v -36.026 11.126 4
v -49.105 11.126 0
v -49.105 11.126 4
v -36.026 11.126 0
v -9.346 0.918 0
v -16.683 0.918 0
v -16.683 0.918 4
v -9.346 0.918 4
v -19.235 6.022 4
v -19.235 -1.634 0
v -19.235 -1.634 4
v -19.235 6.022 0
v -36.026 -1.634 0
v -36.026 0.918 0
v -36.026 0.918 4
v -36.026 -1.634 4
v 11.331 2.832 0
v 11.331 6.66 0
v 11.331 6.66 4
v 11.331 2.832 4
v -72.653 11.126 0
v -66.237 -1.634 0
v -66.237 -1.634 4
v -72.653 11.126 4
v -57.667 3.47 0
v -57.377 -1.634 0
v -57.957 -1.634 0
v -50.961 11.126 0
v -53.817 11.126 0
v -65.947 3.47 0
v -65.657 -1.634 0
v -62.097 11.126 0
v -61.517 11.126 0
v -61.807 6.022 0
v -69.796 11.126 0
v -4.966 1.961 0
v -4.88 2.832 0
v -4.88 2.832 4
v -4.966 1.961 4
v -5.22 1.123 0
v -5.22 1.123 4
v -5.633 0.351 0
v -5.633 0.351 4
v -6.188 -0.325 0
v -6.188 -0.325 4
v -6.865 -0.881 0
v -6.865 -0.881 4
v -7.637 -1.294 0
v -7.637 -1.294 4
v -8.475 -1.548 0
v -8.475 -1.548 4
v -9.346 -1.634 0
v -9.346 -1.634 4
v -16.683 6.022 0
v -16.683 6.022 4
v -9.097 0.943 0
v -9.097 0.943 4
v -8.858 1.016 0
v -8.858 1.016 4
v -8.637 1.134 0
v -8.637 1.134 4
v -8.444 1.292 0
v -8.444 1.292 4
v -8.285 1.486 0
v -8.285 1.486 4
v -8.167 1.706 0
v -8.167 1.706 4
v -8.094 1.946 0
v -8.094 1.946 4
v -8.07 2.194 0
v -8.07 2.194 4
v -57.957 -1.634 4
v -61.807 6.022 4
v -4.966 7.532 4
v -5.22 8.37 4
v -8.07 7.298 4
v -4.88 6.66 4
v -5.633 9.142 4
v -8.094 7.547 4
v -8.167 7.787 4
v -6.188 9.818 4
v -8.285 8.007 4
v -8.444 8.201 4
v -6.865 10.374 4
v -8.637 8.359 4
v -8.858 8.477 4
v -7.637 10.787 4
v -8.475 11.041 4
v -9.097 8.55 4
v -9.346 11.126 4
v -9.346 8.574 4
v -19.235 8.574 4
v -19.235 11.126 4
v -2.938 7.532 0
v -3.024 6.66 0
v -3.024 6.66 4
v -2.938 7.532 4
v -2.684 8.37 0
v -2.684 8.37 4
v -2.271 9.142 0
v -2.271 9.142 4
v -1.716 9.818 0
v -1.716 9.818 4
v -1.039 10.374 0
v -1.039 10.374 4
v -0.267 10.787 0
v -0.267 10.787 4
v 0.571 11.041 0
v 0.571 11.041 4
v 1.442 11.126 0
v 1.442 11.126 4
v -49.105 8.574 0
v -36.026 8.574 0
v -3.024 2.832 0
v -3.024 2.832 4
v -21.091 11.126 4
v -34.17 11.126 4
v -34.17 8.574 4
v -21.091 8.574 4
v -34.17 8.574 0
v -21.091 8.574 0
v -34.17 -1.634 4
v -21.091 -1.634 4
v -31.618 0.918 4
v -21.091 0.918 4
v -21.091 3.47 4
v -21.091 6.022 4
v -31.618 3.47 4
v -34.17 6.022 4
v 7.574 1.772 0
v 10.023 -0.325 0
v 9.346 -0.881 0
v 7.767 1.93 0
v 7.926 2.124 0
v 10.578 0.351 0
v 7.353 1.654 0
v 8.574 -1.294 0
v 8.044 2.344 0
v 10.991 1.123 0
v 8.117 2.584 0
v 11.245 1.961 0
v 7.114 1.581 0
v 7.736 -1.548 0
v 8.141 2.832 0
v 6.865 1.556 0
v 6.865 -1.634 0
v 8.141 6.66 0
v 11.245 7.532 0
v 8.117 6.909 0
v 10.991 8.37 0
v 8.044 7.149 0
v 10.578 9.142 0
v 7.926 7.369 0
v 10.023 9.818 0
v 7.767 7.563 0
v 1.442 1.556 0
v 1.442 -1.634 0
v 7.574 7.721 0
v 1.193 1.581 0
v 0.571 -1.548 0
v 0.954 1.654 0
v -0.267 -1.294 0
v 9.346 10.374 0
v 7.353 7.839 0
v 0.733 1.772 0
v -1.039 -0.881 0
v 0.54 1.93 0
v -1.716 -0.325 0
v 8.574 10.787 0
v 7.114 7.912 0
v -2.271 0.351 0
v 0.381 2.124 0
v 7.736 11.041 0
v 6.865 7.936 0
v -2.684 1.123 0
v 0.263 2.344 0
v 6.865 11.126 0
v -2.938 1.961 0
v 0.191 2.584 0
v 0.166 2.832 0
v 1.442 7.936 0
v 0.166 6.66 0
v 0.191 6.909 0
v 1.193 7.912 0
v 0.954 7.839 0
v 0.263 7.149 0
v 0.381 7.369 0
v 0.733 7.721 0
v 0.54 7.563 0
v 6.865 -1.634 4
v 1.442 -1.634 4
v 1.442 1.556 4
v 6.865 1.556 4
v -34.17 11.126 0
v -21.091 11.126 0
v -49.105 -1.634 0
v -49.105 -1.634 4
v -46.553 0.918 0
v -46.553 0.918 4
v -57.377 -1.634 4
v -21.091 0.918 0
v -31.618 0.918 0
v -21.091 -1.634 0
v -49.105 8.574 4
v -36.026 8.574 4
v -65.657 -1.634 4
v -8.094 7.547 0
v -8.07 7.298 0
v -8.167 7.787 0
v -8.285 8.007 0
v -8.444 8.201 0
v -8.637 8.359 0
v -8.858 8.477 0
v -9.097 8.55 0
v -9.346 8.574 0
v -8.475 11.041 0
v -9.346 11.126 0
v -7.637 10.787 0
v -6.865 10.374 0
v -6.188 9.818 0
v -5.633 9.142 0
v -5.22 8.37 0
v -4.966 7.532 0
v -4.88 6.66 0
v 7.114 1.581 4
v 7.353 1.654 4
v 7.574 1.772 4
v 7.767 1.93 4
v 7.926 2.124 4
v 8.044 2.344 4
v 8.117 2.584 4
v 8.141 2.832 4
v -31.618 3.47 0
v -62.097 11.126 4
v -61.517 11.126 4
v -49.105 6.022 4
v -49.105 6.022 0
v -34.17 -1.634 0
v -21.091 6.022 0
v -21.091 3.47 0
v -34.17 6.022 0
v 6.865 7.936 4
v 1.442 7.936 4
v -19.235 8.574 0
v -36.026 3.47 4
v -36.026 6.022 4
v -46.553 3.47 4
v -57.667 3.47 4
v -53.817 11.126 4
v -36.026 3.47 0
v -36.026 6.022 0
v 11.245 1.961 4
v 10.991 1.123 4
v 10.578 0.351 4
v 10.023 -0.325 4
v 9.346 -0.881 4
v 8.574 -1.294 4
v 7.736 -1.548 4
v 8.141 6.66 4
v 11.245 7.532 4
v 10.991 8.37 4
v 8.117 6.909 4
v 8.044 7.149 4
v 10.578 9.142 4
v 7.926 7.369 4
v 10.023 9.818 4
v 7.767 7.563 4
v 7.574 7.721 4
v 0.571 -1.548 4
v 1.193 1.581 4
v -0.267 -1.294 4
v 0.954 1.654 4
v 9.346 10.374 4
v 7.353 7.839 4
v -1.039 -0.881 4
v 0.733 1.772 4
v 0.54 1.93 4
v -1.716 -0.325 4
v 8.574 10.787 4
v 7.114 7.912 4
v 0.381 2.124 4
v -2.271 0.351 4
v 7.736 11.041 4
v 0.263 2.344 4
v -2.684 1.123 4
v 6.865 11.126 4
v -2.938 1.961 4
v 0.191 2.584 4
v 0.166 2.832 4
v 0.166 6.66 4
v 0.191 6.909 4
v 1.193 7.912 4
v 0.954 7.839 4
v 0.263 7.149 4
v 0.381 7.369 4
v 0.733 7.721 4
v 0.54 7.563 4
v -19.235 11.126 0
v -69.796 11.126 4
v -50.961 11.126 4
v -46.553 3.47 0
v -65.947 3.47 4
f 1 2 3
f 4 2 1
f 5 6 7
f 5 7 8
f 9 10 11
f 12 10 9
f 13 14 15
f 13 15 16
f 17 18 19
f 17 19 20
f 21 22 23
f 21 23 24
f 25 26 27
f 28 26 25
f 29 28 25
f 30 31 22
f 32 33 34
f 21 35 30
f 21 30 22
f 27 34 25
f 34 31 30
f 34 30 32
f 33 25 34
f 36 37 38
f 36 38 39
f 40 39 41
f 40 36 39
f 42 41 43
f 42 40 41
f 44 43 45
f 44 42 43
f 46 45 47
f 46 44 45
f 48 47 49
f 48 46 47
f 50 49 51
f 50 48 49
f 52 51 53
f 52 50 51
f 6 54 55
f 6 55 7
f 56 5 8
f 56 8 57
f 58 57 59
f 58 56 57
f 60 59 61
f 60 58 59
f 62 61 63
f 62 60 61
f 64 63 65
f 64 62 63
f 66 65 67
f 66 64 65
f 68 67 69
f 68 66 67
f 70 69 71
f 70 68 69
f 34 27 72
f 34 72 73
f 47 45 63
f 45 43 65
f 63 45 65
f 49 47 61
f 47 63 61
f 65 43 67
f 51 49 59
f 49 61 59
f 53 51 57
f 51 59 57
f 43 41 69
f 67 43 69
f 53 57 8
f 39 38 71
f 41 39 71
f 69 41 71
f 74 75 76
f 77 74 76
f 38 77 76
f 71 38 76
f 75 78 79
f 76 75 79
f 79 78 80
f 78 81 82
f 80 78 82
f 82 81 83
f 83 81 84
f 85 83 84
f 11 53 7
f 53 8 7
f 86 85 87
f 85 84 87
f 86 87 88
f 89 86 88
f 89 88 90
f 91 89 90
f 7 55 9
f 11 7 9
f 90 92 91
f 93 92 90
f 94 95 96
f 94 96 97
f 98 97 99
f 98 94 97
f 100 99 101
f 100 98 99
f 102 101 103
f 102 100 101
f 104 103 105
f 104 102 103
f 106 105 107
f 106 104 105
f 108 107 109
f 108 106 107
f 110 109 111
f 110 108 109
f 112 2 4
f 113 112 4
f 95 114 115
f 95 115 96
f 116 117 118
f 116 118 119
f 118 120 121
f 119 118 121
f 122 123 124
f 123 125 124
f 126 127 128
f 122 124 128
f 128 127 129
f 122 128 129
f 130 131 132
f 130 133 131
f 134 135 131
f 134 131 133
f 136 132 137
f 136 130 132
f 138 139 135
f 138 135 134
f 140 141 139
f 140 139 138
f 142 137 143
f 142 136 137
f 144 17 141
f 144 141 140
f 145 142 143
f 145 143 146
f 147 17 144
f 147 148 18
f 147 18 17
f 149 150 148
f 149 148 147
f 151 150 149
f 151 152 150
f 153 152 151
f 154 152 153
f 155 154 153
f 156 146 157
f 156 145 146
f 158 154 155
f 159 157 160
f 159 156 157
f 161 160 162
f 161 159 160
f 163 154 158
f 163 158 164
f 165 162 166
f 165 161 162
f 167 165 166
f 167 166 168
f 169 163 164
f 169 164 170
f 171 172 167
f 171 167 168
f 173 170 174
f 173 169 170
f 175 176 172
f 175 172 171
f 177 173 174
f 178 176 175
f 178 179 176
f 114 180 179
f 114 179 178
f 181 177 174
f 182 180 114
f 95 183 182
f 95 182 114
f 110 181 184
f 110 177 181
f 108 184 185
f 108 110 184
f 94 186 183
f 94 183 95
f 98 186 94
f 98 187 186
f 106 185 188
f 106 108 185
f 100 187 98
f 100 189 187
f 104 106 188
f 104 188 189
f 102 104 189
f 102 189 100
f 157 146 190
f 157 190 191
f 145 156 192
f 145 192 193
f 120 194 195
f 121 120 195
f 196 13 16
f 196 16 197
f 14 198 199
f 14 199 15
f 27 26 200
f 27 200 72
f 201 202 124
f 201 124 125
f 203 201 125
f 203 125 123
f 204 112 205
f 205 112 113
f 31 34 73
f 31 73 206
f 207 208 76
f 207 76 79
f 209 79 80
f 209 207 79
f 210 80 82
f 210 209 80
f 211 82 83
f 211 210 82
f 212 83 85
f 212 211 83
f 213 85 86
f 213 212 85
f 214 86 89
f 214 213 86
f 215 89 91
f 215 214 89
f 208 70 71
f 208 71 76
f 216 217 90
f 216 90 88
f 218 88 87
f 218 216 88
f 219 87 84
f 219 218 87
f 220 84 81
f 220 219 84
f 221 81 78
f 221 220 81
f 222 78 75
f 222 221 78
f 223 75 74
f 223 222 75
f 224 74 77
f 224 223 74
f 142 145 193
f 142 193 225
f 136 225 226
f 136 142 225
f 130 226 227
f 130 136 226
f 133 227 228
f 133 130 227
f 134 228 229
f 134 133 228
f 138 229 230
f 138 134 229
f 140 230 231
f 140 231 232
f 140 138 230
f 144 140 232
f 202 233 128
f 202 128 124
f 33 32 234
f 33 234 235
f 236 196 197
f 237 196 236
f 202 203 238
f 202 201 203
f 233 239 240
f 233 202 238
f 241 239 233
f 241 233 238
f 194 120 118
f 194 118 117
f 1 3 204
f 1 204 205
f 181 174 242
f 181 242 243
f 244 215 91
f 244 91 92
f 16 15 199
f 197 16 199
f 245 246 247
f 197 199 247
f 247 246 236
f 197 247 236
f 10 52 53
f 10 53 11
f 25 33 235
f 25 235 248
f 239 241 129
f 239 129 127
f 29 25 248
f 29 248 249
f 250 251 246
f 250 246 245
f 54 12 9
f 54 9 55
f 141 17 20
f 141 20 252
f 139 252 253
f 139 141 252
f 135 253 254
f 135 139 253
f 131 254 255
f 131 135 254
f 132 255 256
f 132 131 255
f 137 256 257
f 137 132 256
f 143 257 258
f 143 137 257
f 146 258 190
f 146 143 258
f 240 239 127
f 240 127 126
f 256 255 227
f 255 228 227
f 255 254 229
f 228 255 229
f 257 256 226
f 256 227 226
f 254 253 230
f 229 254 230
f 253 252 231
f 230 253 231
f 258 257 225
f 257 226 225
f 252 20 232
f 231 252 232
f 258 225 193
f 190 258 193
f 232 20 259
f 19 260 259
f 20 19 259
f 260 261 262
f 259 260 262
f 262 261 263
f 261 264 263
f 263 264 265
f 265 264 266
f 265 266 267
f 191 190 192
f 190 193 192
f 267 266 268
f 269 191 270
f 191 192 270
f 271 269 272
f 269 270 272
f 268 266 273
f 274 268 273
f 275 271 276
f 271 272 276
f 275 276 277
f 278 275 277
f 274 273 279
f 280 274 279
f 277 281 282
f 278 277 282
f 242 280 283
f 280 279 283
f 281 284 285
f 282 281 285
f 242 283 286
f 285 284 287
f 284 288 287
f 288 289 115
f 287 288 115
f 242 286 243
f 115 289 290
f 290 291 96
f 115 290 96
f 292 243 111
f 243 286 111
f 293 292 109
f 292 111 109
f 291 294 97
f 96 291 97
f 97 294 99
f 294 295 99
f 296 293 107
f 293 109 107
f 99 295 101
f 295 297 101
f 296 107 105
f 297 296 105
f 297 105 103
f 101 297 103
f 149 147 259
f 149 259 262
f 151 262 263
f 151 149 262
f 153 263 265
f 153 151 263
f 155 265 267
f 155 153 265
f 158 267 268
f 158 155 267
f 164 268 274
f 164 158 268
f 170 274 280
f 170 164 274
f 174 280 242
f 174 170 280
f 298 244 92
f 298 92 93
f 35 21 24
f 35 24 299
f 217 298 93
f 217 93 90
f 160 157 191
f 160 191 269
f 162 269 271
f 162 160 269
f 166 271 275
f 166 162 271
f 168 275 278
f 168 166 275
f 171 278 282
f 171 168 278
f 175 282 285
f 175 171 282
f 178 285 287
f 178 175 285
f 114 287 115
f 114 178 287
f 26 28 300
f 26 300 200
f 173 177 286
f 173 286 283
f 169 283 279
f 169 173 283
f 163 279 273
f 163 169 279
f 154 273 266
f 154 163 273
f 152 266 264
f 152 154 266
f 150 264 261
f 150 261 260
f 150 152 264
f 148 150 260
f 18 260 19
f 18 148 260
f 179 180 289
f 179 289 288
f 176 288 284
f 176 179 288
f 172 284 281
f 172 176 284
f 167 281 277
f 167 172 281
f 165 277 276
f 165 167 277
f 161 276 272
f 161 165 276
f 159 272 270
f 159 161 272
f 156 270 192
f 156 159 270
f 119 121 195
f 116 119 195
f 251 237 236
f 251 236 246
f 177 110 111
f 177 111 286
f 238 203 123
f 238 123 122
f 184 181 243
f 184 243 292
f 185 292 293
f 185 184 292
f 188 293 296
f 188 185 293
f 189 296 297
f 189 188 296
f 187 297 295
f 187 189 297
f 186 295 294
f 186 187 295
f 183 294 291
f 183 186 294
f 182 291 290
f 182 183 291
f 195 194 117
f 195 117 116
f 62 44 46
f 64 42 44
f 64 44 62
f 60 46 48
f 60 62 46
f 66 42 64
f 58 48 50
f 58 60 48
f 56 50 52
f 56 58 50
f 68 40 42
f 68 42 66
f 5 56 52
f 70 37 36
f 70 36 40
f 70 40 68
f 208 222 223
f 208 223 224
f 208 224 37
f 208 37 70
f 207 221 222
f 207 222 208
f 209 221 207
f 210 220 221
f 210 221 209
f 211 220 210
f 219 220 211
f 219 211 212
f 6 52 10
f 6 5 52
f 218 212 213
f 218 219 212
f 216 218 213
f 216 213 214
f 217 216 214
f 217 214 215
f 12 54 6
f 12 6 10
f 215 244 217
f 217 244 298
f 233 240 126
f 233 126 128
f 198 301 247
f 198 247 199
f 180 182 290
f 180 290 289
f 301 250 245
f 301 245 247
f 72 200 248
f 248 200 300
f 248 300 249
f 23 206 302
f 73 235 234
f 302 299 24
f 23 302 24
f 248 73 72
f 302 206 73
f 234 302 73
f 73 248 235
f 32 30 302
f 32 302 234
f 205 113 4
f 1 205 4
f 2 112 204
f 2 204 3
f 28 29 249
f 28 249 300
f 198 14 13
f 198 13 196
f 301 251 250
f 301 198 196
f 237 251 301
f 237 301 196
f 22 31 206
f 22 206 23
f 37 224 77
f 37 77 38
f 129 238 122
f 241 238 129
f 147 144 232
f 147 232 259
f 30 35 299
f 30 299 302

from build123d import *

# Parameters (mm, degrees)
EXTRUDE_1_DEPTH   = 4
EXTRUDE_1_2_DEPTH = 4
EXTRUDE_1_3_DEPTH = 4
SKETCH_1_W        = 13.079
SKETCH_1_H        = 2.552
EXTRUDE_1_4_DEPTH = 4
EXTRUDE_1_5_DEPTH = 4
EXTRUDE_1_6_DEPTH = 4
EXTRUDE_1_7_DEPTH = 4


with BuildPart() as part:
    # 草图1 → 凸台-拉伸1 (new body)
    with BuildSketch(Plane.XY):
        Polygon((-50.96092739, 11.126463695), (-57.377233738, -1.633536305), (-57.957143582, -1.633536305), (-61.80692739, 6.022463695), (-65.656711199, -1.633536305), (-66.236621043, -1.633536305), (-72.65292739, 11.126463695), (-69.796449929, 11.126463695), (-65.946666121, 3.470463695), (-62.096882313, 11.126463695), (-61.516972468, 11.126463695), (-57.66718866, 3.470463695), (-53.817404851, 11.126463695), align=None)
    extrude(amount=EXTRUDE_1_DEPTH)


with BuildPart() as body_2:
    # 草图1 → Extrude 1 2 (new body)
    with BuildSketch(Plane.XY):
        with BuildLine():
            Line((-19.23492739, 11.126463695), (-9.34592739, 11.126463695))
            ThreePointArc((-9.34592739, 11.126463695), (-6.187988506, 9.81840258), (-4.87992739, 6.660463695))
            Line((-4.87992739, 6.660463695), (-4.87992739, 2.832463695))
            ThreePointArc((-4.87992739, 2.832463695), (-6.187988506, -0.32547519), (-9.34592739, -1.633536305))
            Line((-9.34592739, -1.633536305), (-19.23492739, -1.633536305))
            Line((-19.23492739, -1.633536305), (-19.23492739, 6.022463695))
            Line((-19.23492739, 6.022463695), (-16.68292739, 6.022463695))
            Line((-16.68292739, 6.022463695), (-16.68292739, 0.918463695))
            Line((-16.68292739, 0.918463695), (-9.34592739, 0.918463695))
            ThreePointArc((-9.34592739, 0.918463695), (-8.443659138, 1.292195442), (-8.06992739, 2.194463695))
            Line((-8.06992739, 2.194463695), (-8.06992739, 7.298463695))
            ThreePointArc((-8.06992739, 7.298463695), (-8.443659138, 8.200731948), (-9.34592739, 8.574463695))
            Line((-9.34592739, 8.574463695), (-19.23492739, 8.574463695))
            Line((-19.23492739, 8.574463695), (-19.23492739, 11.126463695))
        make_face()
    extrude(amount=EXTRUDE_1_2_DEPTH)


with BuildPart() as body_3:
    # 草图1 → Extrude 1 3 (new body)
    with BuildSketch(Plane.XY):
        Polygon((-21.09092739, -1.633536305), (-34.16992739, -1.633536305), (-34.16992739, 6.022463695), (-21.09092739, 6.022463695), (-21.09092739, 3.470463695), (-31.61792739, 3.470463695), (-31.61792739, 0.918463695), (-21.09092739, 0.918463695), align=None)
    extrude(amount=EXTRUDE_1_3_DEPTH)


with BuildPart() as body_4:
    # 草图1 → Extrude 1 4 (new body)
    with BuildSketch(Plane.XY):
        with Locations((-42.56542739, 9.850463695)):
            Rectangle(SKETCH_1_W, SKETCH_1_H)
    extrude(amount=EXTRUDE_1_4_DEPTH)


with BuildPart() as body_5:
    # 草图1 → Extrude 1 5 (new body)
    with BuildSketch(Plane.XY):
        Polygon((-36.02592739, 3.470463695), (-46.55292739, 3.470463695), (-46.55292739, 0.918463695), (-36.02592739, 0.918463695), (-36.02592739, -1.633536305), (-49.10492739, -1.633536305), (-49.10492739, 6.022463695), (-36.02592739, 6.022463695), align=None)
    extrude(amount=EXTRUDE_1_5_DEPTH)


with BuildPart() as body_6:
    # 草图1 → Extrude 1 6 (new body)
    with BuildSketch(Plane.XY):
        with Locations((-27.63042739, 9.850463695)):
            Rectangle(SKETCH_1_W, SKETCH_1_H)
    extrude(amount=EXTRUDE_1_6_DEPTH)


with BuildPart() as body_7:
    # 草图1 → Extrude 1 7 (new body)
    with BuildSketch(Plane.XY):
        with BuildLine():
            Line((-3.02392739, 2.832463695), (-3.02392739, 6.660463695))
            ThreePointArc((-3.02392739, 6.660463695), (-1.715866275, 9.81840258), (1.44207261, 11.126463695))
            Line((1.44207261, 11.126463695), (6.86507261, 11.126463695))
            ThreePointArc((6.86507261, 11.126463695), (10.023011494, 9.81840258), (11.33107261, 6.660463695))
            Line((11.33107261, 6.660463695), (11.33107261, 2.832463695))
            ThreePointArc((11.33107261, 2.832463695), (10.023011494, -0.32547519), (6.86507261, -1.633536305))
            Line((6.86507261, -1.633536305), (1.44207261, -1.633536305))
            ThreePointArc((1.44207261, -1.633536305), (-1.715866275, -0.32547519), (-3.02392739, 2.832463695))
        make_face()
        with BuildLine():
            Line((1.44207261, 1.556463695), (6.86507261, 1.556463695))
            ThreePointArc((6.86507261, 1.556463695), (7.767340862, 1.930195442), (8.14107261, 2.832463695))
            Line((8.14107261, 2.832463695), (8.14107261, 6.660463695))
            ThreePointArc((8.14107261, 6.660463695), (7.767340862, 7.562731948), (6.86507261, 7.936463695))
            Line((6.86507261, 7.936463695), (1.44207261, 7.936463695))
            ThreePointArc((1.44207261, 7.936463695), (0.539804357, 7.562731948), (0.16607261, 6.660463695))
            Line((0.16607261, 6.660463695), (0.16607261, 2.832463695))
            ThreePointArc((0.16607261, 2.832463695), (0.539804357, 1.930195442), (1.44207261, 1.556463695))
        make_face(mode=Mode.SUBTRACT)
    extrude(amount=EXTRUDE_1_7_DEPTH)


solid = Compound([part.part, body_2.part, body_3.part, body_4.part, body_5.part, body_6.part, body_7.part])
